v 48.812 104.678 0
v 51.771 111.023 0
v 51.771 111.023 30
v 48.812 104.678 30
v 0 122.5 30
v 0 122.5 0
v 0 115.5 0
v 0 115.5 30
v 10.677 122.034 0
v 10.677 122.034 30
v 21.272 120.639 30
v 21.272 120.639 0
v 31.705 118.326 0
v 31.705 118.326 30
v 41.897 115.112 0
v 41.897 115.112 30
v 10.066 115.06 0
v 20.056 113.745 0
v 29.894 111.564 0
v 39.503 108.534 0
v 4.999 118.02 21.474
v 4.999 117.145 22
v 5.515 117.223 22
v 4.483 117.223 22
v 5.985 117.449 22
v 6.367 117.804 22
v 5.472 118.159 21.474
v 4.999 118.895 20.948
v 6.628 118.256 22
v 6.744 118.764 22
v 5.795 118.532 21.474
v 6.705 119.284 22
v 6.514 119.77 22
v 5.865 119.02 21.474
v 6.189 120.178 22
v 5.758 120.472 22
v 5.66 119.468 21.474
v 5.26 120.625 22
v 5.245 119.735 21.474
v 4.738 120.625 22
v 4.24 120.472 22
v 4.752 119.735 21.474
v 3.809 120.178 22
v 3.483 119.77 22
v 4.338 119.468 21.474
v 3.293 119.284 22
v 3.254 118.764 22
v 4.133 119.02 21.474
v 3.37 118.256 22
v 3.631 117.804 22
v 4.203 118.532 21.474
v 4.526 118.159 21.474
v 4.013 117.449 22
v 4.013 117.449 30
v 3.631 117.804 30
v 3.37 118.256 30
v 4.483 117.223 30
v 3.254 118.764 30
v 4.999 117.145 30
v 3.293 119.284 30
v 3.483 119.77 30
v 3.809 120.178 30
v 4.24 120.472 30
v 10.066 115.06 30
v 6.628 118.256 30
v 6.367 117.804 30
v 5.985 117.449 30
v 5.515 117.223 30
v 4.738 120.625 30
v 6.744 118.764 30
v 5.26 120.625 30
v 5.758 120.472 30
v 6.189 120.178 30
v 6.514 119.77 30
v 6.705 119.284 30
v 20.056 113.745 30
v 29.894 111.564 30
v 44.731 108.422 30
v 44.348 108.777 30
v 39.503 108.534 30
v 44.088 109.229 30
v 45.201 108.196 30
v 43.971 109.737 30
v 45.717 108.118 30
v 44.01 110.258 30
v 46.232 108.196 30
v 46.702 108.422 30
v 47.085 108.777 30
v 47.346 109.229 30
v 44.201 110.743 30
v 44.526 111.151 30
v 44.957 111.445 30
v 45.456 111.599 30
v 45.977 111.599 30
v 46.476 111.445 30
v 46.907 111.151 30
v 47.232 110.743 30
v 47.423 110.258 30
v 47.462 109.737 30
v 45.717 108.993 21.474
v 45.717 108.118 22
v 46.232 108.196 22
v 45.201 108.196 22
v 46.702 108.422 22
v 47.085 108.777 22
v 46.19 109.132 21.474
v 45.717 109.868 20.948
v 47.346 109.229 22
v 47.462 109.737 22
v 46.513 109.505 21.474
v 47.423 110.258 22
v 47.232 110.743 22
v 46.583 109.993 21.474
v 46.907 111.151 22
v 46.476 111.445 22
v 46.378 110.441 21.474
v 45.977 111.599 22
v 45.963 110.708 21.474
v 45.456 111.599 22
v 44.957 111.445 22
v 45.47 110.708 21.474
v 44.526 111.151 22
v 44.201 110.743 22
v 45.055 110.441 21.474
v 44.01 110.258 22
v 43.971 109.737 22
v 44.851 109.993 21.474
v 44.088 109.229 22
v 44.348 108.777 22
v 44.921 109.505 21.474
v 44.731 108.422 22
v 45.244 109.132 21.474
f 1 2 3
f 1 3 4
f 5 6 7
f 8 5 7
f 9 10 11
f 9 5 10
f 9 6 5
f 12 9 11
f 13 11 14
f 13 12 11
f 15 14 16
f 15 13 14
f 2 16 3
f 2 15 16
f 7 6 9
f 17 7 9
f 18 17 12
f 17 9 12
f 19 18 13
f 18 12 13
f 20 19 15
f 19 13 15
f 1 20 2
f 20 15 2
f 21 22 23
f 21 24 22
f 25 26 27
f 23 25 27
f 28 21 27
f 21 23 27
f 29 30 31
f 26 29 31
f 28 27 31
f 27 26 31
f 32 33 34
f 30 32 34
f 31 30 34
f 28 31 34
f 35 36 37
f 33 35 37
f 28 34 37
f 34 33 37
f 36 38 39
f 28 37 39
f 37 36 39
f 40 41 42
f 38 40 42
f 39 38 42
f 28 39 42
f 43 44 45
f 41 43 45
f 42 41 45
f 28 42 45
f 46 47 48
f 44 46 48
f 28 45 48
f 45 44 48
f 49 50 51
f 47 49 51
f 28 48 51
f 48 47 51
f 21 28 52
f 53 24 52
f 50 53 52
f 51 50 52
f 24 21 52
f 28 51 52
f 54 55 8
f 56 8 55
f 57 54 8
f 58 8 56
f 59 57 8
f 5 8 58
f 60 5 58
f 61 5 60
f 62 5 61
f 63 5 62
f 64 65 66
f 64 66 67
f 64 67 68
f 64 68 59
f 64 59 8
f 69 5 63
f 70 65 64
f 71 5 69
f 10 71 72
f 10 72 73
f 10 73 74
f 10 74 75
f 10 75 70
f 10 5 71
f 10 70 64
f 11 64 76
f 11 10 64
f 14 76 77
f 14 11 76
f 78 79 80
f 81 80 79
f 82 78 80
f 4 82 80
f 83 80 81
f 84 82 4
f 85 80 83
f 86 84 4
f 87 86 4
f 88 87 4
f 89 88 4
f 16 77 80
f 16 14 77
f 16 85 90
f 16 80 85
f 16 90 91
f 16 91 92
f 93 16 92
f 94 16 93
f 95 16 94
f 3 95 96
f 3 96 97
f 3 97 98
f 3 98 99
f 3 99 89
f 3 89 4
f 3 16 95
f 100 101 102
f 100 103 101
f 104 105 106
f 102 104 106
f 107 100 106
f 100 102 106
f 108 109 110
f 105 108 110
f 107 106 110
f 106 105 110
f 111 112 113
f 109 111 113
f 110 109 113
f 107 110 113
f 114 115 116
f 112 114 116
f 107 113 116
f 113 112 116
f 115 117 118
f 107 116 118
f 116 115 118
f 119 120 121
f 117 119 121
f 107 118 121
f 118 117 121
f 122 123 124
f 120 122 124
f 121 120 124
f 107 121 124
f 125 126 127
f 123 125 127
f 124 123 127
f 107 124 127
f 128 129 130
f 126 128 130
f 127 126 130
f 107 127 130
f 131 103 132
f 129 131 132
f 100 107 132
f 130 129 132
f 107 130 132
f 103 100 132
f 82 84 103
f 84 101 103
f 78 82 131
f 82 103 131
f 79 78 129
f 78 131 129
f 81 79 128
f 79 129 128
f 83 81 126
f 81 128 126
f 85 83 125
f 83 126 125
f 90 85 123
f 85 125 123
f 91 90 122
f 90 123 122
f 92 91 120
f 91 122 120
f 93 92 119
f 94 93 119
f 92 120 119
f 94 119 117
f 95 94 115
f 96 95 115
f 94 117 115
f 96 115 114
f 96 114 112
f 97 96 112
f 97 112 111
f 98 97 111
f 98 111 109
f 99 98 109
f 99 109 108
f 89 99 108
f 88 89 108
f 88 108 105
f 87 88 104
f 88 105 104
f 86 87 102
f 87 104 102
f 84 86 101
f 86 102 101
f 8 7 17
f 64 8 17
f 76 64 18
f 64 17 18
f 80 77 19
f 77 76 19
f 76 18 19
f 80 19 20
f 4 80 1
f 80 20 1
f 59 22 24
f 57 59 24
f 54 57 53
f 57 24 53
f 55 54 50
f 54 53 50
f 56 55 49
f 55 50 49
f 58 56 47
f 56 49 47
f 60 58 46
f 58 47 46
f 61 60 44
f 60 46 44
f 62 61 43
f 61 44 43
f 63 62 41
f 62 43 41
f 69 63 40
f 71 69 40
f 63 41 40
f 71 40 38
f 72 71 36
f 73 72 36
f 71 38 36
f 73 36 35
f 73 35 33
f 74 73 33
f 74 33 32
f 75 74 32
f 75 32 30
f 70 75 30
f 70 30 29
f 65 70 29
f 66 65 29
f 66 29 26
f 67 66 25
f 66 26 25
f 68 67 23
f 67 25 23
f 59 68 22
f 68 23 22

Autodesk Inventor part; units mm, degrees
ref_plane "YZ Plane" through (0, 0, 0) normal (1, 0, 0) x (0, 1, 0)
ref_plane "XZ Plane" through (0, 0, 0) normal (0, 1, 0) x (-1, 0, 0)
ref_plane "XY Plane" through (0, 0, 0) normal (0, 0, 1) x (1, 0, 0)
sketch "スケッチ1" plane through (0, 0, 0) normal (0, 0, 1) x (1, 0, 0)
  arc A0 (51.7707, 111.0227) -> (0, 122.5) centre (0, 0) ccw
  line L0 (0, 0) -> (0, 122.5) construction
  line L1 (0, 0) -> (122.5, 0) construction
  line L2 (0, 0) -> (51.7707, 111.0227) construction
  arc A1 (48.8124, 104.6785) -> (0, 115.5) centre (0, 0) ccw
  line L3 (0, 122.5) -> (0, 115.5)
  line L4 (51.7707, 111.0227) -> (48.8124, 104.6785)
  dimension "d0" = 122.5
  dimension "d1" = 90
  dimension "d2" = 25
  dimension "d3" = 7
extrude "押し出し1" add sketch "スケッチ1" along normal blind 30
sketch "スケッチ2" plane through (0, 0, 30) normal (0, 0, 1) x (1, 0, 0)
  arc A0 (51.7707, 111.0227) -> (0, 122.5) centre (0, 0) ccw projected
  arc A1 (30.7995, 114.9452) -> (0, 119) centre (0, 0) ccw construction
  line L0 (0, 122.5) -> (0, 115.5) projected
  line L1 (48.8124, 104.6785) -> (51.7707, 111.0227) projected
  point P0 (4.9989, 118.895)
  point P1 (45.7166, 109.8681)
  point P2 (0, 119)
  point P3 (50.2916, 107.8506)
  dimension "d6" = 3.5
  dimension "d7" = 5
  dimension "d8" = 5
hole "穴1" at (4.9989, 118.895, 30) at (45.7166, 109.8681, 30) direction (0, 0, -1) diameter 3.5 depth 8 tip angle 118
equation "\"d8\" = d7"
properties part number "3D_base-connect"
